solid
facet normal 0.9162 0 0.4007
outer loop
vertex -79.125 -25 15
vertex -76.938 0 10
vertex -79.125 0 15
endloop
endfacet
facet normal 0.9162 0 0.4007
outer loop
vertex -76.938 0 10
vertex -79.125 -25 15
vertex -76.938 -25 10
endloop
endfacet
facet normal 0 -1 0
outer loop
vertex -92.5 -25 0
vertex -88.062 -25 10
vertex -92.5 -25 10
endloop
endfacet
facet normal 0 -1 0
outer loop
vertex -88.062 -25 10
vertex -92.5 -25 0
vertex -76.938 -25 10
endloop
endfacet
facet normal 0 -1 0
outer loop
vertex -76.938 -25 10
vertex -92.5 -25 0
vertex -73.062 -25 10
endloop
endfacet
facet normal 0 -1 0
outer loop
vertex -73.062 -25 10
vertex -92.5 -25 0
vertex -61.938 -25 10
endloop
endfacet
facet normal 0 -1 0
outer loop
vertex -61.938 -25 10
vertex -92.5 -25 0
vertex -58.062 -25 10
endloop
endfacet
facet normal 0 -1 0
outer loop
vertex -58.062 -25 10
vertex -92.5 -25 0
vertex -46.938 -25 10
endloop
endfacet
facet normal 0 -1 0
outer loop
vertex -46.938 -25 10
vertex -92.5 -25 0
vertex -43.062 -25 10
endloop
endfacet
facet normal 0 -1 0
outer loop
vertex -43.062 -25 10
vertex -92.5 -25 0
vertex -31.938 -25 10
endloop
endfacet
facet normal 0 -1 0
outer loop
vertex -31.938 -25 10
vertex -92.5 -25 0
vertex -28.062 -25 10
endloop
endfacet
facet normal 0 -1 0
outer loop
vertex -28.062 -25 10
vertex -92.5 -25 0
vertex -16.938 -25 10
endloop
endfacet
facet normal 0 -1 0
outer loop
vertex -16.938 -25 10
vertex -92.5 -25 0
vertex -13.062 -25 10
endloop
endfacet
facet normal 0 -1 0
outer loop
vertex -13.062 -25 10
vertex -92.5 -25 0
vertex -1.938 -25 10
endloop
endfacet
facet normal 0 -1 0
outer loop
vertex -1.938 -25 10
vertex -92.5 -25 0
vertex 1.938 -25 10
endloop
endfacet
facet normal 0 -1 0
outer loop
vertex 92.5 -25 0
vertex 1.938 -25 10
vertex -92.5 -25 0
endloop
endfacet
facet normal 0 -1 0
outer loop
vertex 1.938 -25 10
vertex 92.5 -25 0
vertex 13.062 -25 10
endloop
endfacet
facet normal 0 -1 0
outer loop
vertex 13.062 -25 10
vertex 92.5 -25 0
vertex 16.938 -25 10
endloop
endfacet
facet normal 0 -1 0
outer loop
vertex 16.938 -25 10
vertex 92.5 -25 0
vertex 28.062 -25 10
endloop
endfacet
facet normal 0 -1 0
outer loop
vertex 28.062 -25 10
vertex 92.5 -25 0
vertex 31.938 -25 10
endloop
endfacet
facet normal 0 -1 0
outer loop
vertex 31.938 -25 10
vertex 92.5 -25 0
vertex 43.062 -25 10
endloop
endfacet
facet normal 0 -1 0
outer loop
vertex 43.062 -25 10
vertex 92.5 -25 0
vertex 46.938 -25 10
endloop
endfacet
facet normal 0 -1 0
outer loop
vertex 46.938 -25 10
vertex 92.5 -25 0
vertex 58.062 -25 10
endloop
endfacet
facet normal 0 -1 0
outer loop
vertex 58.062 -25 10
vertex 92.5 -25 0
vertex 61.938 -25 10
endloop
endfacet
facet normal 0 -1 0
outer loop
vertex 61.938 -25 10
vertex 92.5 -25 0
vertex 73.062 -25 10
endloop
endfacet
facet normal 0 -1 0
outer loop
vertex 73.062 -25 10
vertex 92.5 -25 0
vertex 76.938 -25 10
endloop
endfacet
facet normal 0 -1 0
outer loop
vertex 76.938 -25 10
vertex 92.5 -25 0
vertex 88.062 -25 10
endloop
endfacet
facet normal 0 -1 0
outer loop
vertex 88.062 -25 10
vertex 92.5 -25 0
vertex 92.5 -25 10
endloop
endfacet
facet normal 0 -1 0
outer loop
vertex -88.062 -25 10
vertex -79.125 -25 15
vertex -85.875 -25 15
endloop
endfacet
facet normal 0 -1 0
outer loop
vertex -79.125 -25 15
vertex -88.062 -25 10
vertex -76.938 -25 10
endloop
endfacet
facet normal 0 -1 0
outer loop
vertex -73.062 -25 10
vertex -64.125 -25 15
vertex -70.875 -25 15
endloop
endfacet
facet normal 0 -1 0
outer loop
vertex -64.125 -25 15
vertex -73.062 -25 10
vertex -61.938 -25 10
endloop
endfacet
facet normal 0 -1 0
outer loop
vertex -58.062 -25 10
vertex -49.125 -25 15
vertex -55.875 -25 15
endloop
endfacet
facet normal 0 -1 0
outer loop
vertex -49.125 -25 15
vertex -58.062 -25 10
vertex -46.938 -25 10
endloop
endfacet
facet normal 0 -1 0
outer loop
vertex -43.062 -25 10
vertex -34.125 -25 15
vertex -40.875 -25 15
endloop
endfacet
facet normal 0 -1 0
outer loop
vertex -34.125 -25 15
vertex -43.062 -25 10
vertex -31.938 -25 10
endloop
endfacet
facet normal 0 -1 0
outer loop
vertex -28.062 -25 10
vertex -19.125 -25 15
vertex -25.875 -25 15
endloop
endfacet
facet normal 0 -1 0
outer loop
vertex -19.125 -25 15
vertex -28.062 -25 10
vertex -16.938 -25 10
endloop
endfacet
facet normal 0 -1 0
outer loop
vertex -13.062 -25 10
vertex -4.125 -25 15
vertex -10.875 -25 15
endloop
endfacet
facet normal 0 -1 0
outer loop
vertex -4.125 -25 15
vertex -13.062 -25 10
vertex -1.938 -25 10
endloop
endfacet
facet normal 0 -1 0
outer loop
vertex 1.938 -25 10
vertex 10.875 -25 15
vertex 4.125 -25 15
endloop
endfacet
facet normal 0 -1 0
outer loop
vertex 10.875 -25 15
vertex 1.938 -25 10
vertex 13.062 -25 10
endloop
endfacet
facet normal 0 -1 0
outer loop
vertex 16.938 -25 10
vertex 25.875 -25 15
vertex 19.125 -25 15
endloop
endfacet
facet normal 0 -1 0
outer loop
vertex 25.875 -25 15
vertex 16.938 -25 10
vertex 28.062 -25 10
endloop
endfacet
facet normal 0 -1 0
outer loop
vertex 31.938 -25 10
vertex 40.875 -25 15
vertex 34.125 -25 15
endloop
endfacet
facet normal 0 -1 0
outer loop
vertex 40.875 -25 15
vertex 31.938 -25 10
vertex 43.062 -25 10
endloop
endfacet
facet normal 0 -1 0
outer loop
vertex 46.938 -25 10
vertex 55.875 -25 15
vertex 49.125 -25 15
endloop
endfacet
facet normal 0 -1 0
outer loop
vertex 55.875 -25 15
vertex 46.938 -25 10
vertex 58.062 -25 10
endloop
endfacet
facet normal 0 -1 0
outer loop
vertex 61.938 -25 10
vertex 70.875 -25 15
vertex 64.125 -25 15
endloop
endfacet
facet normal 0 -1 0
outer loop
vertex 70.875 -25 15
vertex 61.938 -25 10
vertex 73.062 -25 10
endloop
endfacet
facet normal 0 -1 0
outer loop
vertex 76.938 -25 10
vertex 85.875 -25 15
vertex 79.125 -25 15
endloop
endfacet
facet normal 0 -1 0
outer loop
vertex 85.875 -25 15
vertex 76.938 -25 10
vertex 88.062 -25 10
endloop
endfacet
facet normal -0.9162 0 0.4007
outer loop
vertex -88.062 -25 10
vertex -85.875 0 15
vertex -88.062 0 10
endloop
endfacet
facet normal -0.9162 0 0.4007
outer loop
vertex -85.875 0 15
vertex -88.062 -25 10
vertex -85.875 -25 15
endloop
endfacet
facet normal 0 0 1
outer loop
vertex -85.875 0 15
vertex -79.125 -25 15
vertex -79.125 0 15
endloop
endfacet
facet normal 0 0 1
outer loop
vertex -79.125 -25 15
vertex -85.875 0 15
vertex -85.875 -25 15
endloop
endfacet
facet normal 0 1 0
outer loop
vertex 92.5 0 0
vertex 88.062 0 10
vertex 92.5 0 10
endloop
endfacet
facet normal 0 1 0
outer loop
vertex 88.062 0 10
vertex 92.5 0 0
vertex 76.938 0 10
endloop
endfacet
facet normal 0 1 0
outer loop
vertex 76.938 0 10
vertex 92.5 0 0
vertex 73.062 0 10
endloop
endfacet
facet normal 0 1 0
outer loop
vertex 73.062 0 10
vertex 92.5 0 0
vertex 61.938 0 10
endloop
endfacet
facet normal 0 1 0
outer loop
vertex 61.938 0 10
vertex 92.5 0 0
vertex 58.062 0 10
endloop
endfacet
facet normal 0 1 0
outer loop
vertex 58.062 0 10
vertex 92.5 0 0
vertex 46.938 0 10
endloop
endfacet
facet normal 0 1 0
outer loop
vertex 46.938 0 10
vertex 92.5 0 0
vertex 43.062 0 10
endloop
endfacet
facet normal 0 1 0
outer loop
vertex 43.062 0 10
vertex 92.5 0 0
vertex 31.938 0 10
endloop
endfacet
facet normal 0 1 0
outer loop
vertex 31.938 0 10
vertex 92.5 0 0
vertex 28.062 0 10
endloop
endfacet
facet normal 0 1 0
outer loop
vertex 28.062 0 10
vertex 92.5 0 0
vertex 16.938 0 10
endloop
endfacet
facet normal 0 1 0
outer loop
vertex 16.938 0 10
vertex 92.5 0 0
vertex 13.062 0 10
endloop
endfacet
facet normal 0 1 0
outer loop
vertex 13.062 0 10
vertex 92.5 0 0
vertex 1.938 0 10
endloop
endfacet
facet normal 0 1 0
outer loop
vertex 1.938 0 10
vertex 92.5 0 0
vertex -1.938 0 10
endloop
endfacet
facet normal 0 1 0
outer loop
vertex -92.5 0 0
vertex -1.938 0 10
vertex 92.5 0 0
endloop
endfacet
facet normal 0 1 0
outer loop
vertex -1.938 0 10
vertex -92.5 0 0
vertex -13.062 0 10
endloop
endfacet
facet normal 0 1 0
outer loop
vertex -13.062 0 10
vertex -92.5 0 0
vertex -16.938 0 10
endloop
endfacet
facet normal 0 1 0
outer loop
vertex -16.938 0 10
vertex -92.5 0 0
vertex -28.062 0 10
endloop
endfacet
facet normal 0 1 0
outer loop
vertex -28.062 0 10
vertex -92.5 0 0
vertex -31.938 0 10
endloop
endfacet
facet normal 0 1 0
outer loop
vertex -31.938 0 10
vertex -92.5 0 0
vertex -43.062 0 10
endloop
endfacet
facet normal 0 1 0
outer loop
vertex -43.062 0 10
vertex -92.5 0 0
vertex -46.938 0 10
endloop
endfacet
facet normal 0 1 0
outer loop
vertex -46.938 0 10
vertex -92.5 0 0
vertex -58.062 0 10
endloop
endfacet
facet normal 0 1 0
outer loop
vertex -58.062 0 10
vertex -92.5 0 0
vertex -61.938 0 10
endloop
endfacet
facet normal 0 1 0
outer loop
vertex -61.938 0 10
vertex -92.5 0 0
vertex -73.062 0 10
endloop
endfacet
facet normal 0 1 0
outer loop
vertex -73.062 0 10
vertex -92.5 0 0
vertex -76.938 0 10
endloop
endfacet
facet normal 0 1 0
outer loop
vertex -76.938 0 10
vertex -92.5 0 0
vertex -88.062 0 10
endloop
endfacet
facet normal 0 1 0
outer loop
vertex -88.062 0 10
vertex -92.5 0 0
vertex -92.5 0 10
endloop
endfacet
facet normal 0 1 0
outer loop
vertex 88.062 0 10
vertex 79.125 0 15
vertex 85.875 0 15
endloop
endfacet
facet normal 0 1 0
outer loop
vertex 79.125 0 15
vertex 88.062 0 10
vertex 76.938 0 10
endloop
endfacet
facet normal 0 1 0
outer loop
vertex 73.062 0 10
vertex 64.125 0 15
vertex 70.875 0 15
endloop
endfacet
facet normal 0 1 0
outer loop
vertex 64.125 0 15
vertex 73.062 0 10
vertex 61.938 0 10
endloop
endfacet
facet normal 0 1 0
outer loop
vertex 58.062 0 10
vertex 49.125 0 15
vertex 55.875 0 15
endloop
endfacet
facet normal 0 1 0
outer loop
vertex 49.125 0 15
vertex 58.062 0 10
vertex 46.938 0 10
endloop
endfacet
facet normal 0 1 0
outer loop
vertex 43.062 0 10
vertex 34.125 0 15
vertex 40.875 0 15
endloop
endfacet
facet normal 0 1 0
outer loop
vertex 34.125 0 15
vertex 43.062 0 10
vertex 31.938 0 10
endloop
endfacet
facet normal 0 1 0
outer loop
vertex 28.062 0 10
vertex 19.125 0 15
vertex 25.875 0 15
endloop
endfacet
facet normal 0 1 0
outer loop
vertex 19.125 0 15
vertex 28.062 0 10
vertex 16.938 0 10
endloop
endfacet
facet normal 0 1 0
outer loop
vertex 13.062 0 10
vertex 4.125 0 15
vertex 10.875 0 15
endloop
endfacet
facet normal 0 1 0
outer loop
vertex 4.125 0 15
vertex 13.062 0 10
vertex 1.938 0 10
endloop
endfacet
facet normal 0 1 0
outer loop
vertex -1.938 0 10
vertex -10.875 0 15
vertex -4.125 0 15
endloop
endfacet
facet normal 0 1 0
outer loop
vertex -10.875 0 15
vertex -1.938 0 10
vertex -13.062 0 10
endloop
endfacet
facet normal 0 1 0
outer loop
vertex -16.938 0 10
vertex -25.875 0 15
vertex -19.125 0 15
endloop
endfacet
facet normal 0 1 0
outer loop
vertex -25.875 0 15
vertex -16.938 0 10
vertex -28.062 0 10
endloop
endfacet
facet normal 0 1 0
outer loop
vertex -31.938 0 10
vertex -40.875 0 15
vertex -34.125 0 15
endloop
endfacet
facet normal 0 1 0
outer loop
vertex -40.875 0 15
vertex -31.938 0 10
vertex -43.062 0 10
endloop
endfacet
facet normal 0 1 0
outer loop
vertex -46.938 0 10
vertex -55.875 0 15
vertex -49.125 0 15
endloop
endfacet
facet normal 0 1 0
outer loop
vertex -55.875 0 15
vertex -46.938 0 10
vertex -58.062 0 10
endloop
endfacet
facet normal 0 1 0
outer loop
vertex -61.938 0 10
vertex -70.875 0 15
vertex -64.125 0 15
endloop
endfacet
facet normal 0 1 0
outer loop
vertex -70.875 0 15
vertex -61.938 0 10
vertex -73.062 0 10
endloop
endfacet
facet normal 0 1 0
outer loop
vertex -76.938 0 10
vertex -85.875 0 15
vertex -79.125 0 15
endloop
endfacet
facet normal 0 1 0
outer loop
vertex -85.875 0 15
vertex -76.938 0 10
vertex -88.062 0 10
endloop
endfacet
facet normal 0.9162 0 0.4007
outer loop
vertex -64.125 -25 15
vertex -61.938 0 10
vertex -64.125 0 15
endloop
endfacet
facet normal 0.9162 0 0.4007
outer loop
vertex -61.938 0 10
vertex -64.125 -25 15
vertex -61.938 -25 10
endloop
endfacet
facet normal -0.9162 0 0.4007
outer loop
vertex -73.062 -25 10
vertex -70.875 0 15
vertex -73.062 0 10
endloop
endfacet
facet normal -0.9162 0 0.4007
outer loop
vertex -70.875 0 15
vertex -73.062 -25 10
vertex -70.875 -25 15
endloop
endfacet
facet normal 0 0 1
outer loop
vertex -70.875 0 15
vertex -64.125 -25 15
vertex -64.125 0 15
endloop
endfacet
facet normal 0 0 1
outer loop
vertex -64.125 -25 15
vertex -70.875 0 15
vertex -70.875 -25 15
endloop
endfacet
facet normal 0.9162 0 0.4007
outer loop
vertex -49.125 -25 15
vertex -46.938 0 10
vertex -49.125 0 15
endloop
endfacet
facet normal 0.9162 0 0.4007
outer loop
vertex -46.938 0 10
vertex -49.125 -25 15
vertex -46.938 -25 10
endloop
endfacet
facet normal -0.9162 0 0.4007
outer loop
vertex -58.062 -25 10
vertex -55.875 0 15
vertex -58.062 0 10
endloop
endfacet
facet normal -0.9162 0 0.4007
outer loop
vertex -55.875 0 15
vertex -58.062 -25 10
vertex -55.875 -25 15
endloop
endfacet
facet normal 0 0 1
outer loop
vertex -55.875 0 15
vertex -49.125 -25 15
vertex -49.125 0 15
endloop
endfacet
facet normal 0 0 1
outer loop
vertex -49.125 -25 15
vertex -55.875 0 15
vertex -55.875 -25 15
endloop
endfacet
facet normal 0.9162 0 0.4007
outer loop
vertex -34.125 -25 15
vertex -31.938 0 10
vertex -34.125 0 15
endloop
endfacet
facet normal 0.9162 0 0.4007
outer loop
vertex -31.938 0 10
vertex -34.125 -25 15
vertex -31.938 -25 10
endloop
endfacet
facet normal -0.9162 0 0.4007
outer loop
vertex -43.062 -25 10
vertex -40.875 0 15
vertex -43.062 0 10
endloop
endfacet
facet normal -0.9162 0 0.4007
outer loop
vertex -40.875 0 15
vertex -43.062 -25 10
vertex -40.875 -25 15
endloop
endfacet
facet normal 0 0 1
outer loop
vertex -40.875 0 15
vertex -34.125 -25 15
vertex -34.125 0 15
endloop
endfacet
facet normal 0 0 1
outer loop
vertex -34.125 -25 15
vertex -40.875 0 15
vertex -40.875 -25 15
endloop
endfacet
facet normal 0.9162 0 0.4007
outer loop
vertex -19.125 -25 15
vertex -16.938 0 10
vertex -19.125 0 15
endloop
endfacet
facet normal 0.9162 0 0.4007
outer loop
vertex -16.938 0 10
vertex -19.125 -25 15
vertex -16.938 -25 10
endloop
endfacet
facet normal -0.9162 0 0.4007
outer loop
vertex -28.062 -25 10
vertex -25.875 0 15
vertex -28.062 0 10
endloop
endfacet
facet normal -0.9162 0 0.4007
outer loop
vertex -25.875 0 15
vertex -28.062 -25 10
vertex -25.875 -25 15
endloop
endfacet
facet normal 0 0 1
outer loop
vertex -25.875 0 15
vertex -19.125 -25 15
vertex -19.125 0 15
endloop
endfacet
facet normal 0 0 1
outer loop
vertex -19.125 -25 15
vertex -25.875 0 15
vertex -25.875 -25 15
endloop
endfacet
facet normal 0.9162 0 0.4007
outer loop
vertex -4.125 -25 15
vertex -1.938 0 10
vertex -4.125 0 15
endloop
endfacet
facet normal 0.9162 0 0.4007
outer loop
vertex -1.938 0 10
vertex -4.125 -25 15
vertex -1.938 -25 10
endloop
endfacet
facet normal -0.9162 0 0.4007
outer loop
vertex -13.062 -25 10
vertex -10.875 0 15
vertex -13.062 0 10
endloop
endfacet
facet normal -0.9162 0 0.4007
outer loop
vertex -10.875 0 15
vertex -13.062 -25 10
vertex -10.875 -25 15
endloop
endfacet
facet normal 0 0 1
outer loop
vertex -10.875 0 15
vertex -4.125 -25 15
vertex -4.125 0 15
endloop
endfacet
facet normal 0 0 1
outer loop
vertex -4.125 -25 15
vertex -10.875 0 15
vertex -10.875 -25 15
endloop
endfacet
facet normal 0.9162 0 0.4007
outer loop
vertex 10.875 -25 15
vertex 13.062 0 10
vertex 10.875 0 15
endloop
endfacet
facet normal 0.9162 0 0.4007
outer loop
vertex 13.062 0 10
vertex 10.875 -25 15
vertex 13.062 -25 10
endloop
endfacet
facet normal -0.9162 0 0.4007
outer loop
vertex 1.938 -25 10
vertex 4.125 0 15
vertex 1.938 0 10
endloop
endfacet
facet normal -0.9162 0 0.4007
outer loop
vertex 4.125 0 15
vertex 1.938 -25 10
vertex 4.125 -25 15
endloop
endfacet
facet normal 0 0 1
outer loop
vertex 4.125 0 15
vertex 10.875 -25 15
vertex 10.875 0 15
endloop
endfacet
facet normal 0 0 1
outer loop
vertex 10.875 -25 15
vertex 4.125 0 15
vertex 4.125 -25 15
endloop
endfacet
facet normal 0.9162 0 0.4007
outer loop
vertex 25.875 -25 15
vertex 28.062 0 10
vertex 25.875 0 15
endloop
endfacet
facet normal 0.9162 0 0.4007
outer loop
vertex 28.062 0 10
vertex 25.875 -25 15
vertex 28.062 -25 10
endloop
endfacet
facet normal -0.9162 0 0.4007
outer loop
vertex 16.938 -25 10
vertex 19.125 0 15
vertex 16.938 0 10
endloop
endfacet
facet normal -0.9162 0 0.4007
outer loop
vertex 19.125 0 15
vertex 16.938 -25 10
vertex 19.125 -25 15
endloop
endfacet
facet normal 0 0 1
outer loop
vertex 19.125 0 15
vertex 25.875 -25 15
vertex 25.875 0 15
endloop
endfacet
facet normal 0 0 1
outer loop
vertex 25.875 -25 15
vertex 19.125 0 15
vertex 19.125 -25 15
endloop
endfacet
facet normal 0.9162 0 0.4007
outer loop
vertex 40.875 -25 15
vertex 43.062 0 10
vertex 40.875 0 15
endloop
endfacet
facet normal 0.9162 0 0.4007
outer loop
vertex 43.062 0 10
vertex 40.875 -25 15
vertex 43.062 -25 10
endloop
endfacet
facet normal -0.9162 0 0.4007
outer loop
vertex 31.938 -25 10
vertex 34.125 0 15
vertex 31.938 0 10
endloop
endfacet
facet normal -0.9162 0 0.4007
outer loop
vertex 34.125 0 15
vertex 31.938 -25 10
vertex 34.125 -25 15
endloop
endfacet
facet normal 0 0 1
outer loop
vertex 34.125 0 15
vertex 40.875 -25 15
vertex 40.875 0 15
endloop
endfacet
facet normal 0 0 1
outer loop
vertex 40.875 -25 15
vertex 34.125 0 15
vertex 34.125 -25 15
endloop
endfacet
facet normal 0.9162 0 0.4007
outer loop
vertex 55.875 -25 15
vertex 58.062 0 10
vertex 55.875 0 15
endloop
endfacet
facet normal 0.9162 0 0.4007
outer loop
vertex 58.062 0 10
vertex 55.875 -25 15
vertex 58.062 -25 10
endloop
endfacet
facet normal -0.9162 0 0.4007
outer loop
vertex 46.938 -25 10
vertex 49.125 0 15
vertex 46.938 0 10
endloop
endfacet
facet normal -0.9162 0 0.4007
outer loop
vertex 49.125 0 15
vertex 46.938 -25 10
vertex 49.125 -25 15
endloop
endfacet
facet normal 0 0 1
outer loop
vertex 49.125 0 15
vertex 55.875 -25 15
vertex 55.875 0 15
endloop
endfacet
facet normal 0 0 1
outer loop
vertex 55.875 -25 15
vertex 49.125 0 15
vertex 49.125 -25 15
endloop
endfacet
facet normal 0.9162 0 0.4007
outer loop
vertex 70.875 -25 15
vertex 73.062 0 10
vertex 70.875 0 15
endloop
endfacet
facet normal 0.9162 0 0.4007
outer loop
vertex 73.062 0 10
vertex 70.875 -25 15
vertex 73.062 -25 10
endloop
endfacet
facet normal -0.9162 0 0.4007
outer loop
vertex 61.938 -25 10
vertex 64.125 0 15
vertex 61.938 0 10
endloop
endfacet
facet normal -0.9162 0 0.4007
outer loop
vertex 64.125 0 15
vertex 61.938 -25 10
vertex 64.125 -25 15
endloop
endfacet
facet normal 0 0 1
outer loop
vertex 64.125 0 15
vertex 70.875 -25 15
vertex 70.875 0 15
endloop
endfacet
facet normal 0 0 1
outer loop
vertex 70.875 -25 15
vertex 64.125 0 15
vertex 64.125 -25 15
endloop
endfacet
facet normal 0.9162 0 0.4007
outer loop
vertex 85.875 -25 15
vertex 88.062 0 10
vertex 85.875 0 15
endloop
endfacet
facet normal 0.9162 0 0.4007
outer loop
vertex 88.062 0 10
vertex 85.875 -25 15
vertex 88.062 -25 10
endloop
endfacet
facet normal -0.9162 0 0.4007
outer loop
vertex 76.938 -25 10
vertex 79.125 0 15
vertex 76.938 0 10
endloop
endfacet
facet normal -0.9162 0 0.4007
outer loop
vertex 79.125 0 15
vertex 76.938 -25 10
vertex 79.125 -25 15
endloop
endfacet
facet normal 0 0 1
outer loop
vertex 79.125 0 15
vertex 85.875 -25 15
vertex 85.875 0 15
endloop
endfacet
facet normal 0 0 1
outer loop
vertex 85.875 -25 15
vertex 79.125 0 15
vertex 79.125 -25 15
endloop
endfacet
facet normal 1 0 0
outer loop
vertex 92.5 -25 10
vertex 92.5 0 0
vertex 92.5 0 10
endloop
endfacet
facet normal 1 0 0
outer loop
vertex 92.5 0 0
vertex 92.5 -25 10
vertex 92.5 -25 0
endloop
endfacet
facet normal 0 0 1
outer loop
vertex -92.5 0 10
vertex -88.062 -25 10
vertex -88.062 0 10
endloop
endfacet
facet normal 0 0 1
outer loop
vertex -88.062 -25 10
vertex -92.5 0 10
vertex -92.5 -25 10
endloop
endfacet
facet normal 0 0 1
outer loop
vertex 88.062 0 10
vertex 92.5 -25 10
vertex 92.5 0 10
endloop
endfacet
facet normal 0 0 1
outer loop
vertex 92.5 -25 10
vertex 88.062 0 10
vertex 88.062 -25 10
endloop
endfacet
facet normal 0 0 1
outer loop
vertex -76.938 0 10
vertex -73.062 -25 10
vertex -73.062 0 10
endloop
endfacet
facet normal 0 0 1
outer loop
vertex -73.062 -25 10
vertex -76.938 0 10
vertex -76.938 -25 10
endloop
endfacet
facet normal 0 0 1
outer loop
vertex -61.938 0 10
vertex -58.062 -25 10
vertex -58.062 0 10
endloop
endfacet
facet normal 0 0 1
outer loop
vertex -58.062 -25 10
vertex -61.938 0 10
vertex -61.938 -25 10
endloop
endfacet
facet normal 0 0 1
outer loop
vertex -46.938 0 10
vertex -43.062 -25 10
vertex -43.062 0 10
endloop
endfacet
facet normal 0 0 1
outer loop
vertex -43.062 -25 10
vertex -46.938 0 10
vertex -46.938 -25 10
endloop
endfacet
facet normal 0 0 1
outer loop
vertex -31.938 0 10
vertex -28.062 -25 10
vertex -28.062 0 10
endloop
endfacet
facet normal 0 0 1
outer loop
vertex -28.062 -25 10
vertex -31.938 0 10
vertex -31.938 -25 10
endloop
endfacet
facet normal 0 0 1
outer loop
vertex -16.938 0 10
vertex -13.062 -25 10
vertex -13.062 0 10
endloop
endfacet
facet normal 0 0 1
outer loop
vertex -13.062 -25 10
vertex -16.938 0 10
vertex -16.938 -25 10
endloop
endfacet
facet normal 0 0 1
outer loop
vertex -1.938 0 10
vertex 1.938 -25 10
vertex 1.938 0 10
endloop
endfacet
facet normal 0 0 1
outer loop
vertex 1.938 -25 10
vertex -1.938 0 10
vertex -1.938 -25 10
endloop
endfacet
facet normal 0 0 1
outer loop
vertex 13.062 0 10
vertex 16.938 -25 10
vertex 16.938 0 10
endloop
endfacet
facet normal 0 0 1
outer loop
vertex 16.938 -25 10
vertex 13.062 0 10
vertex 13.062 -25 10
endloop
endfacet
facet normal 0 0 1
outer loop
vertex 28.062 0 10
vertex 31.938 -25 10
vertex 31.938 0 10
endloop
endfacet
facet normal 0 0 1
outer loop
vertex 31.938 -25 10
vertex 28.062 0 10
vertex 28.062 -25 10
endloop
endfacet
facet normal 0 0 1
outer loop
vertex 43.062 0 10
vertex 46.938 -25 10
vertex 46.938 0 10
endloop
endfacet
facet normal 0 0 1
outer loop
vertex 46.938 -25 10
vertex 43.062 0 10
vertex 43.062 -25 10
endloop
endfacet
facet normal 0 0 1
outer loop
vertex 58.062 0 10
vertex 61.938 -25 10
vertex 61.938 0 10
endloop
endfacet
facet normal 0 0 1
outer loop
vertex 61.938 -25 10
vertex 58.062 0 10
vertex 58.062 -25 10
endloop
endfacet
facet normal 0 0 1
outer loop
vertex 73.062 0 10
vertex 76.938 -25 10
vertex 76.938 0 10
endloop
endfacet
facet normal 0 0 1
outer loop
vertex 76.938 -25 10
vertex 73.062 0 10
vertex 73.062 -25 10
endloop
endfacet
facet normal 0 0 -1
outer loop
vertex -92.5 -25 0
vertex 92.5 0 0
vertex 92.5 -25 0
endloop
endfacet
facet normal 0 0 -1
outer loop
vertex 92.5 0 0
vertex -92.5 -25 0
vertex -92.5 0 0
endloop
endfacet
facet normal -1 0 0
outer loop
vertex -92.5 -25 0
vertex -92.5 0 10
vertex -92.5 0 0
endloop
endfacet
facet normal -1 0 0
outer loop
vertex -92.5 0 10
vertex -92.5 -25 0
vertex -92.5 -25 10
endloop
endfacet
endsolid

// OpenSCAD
$fn = 32;

// ----------------------------------------------------------------------
// Toothed rack, 12 teeth
// 15 mm pitch, 5 mm teeth
// ----------------------------------------------------------------------

// --- parameters (mm) ---
bar_w = 25;      // bar width (Y)
bar_h = 10;      // bar height (Z)
teeth = 12;      // number of teeth
pitch = 15;      // tooth pitch
tooth_h = 5;     // tooth height above the bar
root_w = 12;     // tooth width at the root
crest_w = 6.75;  // tooth width at the crest

// --- derived feature positions (mm) ---
span = (teeth - 1) * pitch;  // = 165   distance between the outer teeth
bar_l = span + root_w + 8;   // = 185   bar length: teeth plus 4 mm at each end
tooth_x = -span / 2;         // = -82.5   X of the first tooth
height = bar_h + tooth_h;    // = 15   overall height
feature_centers = [
  [tooth_x + 0 * pitch, -bar_w / 2],
  [tooth_x + 1 * pitch, -bar_w / 2],
  [tooth_x + 2 * pitch, -bar_w / 2],
  [tooth_x + 3 * pitch, -bar_w / 2],
  [tooth_x + 4 * pitch, -bar_w / 2],
  [tooth_x + 5 * pitch, -bar_w / 2],
  [tooth_x + 6 * pitch, -bar_w / 2],
  [tooth_x + 7 * pitch, -bar_w / 2],
  [tooth_x + 8 * pitch, -bar_w / 2],
  [tooth_x + 9 * pitch, -bar_w / 2],
  [tooth_x + 10 * pitch, -bar_w / 2],
  [tooth_x + 11 * pitch, -bar_w / 2]
];   // tooth centre line, drives the tooth loop

// bar with a rack of teeth, one extruded trapezoium per centre
module rack_tooth() {
  linear_extrude(height = bar_w)
    polygon(points = [
      [0, 0],
      [root_w, 0],
      [root_w / 2 + crest_w / 2, tooth_h + 1],
      [root_w / 2 - crest_w / 2, tooth_h + 1]
    ]);
}

union() {
  translate([-bar_l / 2, -bar_w, 0]) cube([bar_l, bar_w, bar_h]);
  for (centre = feature_centers)
    translate([centre[0] - root_w / 2, 0, bar_h - 1]) rotate([90, 0, 0]) rack_tooth();
}
